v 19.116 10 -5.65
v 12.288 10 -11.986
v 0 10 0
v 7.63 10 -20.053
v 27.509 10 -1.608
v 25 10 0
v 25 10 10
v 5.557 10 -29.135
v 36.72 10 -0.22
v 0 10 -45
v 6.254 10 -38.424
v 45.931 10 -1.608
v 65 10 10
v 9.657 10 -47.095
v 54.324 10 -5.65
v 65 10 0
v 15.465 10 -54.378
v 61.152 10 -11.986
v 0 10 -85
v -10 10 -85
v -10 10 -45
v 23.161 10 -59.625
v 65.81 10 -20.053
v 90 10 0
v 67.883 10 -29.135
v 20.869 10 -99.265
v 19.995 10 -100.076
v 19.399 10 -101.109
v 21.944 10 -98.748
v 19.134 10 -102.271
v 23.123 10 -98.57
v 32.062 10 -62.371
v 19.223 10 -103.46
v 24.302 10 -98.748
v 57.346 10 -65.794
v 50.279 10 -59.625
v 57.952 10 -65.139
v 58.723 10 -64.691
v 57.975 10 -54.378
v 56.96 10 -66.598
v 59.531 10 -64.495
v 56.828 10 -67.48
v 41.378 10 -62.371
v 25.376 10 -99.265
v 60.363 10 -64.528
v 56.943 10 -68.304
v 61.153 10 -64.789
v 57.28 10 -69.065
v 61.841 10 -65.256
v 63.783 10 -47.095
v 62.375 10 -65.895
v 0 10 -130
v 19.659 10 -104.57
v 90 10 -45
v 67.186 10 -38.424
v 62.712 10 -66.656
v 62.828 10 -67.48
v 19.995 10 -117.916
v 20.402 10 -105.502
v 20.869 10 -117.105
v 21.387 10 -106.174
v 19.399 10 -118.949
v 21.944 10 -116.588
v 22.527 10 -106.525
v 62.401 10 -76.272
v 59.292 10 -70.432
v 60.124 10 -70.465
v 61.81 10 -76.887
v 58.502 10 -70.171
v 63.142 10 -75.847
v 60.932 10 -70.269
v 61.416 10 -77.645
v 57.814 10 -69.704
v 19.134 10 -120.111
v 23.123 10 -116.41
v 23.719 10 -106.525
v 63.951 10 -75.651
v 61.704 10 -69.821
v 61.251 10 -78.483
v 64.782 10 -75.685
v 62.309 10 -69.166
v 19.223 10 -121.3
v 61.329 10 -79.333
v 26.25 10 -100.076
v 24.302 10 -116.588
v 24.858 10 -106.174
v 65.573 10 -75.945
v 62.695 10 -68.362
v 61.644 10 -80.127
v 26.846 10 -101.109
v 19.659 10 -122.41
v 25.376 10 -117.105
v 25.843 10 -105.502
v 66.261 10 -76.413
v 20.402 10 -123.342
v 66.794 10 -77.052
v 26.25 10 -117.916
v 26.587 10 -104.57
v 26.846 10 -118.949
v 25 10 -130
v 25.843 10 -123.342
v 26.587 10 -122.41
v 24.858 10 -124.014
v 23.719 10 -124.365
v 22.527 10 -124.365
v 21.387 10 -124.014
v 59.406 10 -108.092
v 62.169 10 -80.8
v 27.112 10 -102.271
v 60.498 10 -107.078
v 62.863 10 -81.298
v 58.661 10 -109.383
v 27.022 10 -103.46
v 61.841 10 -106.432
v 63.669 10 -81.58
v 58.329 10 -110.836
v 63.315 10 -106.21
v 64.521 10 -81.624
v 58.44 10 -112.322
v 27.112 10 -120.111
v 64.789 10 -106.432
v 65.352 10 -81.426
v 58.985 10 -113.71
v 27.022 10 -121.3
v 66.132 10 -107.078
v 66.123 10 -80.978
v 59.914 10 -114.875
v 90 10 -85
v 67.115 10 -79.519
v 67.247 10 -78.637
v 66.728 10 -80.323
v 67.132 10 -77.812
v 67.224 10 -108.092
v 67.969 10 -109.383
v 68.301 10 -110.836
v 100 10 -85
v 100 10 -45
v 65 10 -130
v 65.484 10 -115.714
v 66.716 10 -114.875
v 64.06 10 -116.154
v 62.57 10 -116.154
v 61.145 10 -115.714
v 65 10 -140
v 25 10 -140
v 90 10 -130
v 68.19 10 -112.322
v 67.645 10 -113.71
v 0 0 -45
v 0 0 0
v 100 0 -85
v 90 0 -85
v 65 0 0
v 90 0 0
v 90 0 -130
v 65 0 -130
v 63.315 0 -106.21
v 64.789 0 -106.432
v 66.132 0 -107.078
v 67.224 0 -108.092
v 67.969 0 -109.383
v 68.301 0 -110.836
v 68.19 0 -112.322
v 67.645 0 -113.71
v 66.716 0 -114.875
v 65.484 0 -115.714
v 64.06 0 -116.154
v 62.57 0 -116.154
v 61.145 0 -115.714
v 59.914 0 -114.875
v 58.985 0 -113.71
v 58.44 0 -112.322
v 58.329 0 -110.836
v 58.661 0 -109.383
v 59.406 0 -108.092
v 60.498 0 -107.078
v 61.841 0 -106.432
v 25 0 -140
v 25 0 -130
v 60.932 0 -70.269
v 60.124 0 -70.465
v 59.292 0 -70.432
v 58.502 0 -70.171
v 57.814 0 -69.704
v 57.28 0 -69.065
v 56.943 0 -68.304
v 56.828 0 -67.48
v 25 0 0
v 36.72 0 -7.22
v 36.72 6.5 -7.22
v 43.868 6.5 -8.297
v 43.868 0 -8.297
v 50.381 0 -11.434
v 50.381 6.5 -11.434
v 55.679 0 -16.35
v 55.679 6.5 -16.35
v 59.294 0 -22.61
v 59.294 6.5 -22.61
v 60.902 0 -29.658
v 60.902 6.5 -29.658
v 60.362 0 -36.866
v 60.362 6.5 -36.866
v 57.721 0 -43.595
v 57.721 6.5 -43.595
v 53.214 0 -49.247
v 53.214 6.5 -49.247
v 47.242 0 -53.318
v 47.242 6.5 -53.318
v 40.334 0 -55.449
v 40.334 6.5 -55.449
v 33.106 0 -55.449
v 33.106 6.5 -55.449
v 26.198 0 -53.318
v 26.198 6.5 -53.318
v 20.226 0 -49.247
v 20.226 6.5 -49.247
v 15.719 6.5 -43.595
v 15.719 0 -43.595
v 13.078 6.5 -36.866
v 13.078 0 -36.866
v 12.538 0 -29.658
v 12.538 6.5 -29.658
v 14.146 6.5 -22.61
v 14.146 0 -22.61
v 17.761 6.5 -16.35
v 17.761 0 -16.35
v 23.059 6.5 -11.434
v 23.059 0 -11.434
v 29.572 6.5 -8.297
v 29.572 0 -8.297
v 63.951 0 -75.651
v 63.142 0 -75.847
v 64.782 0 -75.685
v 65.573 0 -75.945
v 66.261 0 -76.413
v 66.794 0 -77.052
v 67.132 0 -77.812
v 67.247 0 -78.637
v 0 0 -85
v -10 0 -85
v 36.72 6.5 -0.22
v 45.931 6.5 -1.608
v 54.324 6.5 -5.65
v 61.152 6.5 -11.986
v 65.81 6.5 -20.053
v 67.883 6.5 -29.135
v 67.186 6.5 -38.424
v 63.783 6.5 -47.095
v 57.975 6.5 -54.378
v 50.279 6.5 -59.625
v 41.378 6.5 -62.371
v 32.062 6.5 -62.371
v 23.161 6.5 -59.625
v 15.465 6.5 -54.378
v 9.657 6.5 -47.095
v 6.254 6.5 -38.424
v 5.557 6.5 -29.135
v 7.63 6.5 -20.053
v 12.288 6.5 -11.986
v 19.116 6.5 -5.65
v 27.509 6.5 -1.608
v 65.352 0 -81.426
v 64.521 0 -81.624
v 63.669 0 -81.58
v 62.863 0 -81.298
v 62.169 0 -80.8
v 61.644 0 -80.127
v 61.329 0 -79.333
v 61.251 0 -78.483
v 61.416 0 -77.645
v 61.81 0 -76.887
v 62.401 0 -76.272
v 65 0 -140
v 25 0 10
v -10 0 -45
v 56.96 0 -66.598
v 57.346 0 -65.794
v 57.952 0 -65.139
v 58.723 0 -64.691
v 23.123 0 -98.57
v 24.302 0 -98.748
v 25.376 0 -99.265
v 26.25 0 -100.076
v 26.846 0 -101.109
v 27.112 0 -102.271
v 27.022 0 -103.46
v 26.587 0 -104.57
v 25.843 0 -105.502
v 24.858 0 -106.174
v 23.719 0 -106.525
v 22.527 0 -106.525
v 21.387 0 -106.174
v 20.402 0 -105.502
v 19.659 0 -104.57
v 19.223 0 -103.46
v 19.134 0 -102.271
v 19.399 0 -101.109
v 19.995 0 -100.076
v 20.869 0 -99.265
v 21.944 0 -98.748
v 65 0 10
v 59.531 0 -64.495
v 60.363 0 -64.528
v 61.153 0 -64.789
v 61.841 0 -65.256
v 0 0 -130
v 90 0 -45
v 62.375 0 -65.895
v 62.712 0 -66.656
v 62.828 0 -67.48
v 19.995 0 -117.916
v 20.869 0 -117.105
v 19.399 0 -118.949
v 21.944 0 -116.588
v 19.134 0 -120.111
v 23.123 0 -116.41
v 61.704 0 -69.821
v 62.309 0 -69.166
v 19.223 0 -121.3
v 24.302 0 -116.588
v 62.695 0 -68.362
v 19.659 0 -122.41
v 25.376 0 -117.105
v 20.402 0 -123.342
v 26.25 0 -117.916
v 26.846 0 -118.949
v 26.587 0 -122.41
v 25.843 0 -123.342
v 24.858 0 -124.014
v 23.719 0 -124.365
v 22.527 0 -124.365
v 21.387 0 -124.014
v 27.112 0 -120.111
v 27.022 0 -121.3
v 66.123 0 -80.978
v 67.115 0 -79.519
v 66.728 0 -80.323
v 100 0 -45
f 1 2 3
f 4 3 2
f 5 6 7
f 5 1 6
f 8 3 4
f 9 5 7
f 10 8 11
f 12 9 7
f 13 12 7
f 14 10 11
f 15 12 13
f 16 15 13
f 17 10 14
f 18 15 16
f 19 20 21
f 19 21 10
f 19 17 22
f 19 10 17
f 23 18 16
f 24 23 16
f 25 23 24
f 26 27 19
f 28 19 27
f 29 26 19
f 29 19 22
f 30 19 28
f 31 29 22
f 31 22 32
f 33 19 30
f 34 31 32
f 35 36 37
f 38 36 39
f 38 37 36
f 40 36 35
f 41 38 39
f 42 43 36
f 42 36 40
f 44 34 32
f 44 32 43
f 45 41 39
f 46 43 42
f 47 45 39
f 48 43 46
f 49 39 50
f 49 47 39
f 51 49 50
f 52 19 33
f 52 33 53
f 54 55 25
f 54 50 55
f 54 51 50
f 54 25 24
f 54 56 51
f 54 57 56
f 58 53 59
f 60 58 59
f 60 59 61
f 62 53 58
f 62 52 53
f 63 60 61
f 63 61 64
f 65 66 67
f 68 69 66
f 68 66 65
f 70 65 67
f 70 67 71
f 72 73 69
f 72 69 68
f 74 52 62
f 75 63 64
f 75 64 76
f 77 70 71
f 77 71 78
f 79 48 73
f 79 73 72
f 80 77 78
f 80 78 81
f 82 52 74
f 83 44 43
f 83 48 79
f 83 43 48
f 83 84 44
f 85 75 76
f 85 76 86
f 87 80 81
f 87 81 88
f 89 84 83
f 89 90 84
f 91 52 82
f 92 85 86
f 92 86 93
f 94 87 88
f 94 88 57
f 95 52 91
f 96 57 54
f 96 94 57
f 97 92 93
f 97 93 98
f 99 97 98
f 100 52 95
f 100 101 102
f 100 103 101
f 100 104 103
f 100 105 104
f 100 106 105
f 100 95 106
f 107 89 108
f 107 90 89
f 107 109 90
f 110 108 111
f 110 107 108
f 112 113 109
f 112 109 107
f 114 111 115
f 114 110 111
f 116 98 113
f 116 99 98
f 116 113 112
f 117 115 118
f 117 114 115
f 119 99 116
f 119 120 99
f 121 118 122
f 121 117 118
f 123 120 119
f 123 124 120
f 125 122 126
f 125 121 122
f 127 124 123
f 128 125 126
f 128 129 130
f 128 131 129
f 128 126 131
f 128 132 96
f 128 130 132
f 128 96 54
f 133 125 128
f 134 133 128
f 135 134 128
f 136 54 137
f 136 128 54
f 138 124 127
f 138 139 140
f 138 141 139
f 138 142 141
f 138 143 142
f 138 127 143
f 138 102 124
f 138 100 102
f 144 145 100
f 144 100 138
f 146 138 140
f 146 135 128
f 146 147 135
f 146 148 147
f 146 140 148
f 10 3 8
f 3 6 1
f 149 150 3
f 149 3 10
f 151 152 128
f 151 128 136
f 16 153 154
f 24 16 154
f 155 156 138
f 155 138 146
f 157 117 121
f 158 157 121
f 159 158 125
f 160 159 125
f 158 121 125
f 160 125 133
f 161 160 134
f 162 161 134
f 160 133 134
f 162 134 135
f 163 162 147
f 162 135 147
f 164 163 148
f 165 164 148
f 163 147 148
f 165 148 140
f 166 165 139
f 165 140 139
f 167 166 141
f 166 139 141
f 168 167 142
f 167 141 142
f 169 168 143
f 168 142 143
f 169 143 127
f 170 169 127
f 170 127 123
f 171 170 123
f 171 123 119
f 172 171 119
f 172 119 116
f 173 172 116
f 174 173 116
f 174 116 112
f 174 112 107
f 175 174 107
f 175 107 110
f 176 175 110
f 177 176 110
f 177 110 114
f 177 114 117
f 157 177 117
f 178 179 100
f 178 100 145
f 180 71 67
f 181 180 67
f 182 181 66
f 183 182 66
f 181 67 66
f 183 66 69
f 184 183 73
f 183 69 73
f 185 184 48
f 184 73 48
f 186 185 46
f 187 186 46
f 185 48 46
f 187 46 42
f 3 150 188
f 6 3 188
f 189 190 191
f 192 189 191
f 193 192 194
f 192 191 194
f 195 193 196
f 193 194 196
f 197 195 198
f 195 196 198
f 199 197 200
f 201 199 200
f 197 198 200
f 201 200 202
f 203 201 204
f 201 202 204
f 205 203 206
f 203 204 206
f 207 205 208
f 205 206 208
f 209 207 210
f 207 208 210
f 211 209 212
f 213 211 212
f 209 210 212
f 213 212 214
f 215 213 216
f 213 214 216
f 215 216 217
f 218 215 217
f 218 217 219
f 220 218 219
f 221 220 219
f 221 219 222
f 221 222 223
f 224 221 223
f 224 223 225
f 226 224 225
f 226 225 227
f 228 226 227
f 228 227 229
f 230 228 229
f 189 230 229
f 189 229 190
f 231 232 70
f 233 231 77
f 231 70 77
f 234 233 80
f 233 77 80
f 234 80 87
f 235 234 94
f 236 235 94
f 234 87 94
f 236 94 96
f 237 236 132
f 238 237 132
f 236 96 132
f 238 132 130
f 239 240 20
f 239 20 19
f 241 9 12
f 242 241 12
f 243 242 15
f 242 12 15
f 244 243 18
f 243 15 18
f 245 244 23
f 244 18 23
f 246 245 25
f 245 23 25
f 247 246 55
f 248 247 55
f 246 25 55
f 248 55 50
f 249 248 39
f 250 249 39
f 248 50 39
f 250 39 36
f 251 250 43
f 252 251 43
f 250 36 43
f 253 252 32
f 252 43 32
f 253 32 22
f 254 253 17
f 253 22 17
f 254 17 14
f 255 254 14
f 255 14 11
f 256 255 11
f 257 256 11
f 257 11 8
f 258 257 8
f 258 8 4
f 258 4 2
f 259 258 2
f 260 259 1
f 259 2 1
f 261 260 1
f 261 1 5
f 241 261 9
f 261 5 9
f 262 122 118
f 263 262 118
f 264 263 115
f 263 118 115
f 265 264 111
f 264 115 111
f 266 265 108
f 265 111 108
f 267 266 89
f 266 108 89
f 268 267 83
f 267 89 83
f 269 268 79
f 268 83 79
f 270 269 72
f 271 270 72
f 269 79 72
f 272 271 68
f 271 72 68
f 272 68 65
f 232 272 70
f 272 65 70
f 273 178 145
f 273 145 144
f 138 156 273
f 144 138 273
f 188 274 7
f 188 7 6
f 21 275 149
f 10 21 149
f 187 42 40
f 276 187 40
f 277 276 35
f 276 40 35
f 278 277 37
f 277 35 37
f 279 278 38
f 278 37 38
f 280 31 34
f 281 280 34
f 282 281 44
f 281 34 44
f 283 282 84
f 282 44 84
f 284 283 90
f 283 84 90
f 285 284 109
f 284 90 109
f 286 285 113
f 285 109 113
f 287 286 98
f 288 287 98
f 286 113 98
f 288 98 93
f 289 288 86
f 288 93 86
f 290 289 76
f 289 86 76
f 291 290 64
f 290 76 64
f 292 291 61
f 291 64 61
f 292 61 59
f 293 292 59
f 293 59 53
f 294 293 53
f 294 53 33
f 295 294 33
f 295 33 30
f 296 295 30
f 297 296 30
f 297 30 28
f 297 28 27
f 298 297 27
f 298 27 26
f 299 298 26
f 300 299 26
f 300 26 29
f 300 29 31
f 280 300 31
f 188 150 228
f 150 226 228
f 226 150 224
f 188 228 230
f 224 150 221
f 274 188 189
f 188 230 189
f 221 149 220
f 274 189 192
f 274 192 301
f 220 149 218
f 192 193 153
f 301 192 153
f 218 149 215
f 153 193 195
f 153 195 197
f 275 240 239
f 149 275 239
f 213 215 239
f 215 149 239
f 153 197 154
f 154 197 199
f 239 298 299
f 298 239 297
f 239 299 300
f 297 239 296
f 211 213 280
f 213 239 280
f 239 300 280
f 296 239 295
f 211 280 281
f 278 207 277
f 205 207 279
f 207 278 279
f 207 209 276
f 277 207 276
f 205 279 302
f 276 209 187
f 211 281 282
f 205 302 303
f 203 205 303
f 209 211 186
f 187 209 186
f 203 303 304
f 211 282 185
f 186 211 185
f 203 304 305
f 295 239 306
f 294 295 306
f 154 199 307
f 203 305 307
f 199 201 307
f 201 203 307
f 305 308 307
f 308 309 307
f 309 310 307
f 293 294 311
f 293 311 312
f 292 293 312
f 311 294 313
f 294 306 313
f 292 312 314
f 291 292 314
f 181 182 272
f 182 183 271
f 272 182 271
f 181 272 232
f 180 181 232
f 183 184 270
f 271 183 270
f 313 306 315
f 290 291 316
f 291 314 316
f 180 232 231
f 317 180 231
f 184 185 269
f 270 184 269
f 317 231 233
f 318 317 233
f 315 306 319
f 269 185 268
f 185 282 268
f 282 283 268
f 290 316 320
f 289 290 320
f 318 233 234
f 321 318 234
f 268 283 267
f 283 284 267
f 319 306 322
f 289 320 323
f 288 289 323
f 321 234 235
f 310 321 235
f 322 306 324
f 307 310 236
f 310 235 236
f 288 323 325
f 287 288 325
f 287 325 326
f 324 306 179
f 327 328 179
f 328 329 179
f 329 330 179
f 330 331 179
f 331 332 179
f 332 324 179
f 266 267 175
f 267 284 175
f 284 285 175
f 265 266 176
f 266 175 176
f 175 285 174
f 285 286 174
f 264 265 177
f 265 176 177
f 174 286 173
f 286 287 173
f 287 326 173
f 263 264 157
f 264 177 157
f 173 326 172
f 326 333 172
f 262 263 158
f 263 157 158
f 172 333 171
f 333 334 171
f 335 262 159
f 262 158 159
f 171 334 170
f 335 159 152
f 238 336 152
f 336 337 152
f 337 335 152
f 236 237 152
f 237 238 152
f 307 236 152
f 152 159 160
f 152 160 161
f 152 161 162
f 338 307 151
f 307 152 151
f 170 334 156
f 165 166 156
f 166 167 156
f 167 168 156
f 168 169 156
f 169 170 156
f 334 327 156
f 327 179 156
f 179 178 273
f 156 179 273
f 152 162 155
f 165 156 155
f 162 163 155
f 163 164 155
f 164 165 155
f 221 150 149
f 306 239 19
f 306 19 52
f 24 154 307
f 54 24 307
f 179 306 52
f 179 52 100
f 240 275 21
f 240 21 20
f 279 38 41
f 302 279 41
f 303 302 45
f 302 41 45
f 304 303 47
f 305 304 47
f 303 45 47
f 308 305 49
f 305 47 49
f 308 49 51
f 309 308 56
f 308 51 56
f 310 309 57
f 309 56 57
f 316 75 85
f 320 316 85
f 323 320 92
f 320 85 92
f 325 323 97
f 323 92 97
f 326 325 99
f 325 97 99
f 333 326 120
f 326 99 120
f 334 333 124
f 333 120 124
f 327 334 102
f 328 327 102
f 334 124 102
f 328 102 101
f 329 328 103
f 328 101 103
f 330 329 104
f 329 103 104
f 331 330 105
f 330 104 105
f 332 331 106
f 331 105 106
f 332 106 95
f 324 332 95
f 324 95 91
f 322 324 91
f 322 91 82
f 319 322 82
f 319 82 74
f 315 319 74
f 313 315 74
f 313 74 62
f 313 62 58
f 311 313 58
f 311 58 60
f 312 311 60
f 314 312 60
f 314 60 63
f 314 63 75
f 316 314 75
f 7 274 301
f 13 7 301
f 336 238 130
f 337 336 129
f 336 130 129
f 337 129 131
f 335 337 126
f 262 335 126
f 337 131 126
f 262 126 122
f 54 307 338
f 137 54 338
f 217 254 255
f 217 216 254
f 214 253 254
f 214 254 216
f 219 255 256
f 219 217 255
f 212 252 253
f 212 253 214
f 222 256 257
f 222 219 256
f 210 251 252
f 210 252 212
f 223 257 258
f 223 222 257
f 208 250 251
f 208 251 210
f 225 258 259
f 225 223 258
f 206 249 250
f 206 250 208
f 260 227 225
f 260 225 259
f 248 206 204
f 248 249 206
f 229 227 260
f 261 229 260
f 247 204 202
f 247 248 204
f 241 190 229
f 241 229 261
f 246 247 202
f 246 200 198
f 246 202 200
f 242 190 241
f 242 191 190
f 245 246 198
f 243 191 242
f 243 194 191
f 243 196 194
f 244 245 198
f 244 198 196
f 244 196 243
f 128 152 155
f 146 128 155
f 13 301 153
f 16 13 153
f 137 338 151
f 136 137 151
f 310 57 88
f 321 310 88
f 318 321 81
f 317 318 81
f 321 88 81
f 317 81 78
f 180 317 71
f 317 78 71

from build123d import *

# Parameters (mm, degrees)
SKETCH1_W           = 90
SKETCH1_H           = 130
SKETCH1_W_2         = 10
SKETCH1_H_2         = 40
SKETCH1_W_3         = 40
SKETCH1_H_3         = 10
BOSS_EXTRUDE1_DEPTH = 10
SKETCH2_R           = 4
CUT_EXTRUDE1_DEPTH  = 173.336879396
CUT_EXTRUDE2_DEPTH  = 173.336879396
SKETCH4_R           = 31.25
CUT_EXTRUDE3_DEPTH  = 3.5
SKETCH5_R           = 24.25
CUT_EXTRUDE4_DEPTH  = 173.169248125
SKETCH6_R           = 5
CUT_EXTRUDE5_DEPTH  = 173.336879396


with BuildPart() as part:
    # Sketch1 → Boss-Extrude1 (new body)
    with BuildSketch(Plane(origin=(0, 0, 0), x_dir=(1, 0, 0), z_dir=(0, 1, 0))):
        with Locations((45, 65)):
            Rectangle(SKETCH1_W, SKETCH1_H)
        with Locations((-5, 65)):
            Rectangle(SKETCH1_W_2, SKETCH1_H_2)
        with Locations((95, 65)):
            Rectangle(SKETCH1_W_2, SKETCH1_H_2)
        with Locations((45, -5)):
            Rectangle(SKETCH1_W_3, SKETCH1_H_3)
        with Locations((45, 135)):
            Rectangle(SKETCH1_W_3, SKETCH1_H_3)
    extrude(amount=BOSS_EXTRUDE1_DEPTH)

    # Sketch2 → Cut-Extrude1 (cut, through all)
    with BuildSketch(Plane(origin=(0, 10, 0), x_dir=(1, 0, 0), z_dir=(0, 1, 0))):
        with Locations(Location((23.122776972, 102.57, 0), (0, 0, 270))):
            Circle(SKETCH2_R)
        with Locations(Location((23.122776972, 120.41, 0), (0, 0, 270))):
            Circle(SKETCH2_R)
    extrude(amount=-CUT_EXTRUDE1_DEPTH, mode=Mode.SUBTRACT)

    # Sketch3 → Cut-Extrude2 (cut, through all)
    with BuildSketch(Plane(origin=(0, 10, 0), x_dir=(1, 0, 0), z_dir=(0, 1, 0))):
        with BuildLine():
            ThreePointArc((65.351977614, 81.42565129), (61.457970709, 79.741397678), (63.142224321, 75.847390774))
            Line((63.142224321, 75.847390774), (65.351977614, 81.42565129))
        make_face()
        with BuildLine():
            Line((65.351977614, 81.42565129), (63.142224321, 75.847390774))
            ThreePointArc((63.142224321, 75.847390774), (65.93312737, 76.155127276), (67.247100967, 78.636521032))
            ThreePointArc((67.247100967, 78.636521032), (66.728494723, 80.322547434), (65.351977614, 81.42565129))
        make_face()
        with BuildLine():
            ThreePointArc((58.722717735, 64.690869742), (61.513620784, 64.998606245), (62.827594381, 67.48))
            Line((62.827594381, 67.48), (59.827594381, 67.48))
            Line((59.827594381, 67.48), (58.722717735, 64.690869742))
        make_face()
        with BuildLine():
            Line((59.827594381, 67.48), (62.827594381, 67.48))
            ThreePointArc((62.827594381, 67.48), (62.308988137, 69.166026403), (60.932471028, 70.269130258))
            Line((60.932471028, 70.269130258), (59.827594381, 67.48))
        make_face()
        with BuildLine():
            Line((58.722717735, 64.690869742), (59.827594381, 67.48))
            Line((59.827594381, 67.48), (56.827594381, 67.48))
            ThreePointArc((56.827594381, 67.48), (57.346200626, 65.793973597), (58.722717735, 64.690869742))
        make_face()
        with BuildLine():
            Line((56.827594381, 67.48), (59.827594381, 67.48))
            Line((59.827594381, 67.48), (60.932471028, 70.269130258))
            ThreePointArc((60.932471028, 70.269130258), (58.141567979, 69.961393755), (56.827594381, 67.48))
        make_face()
    extrude(amount=-CUT_EXTRUDE2_DEPTH, mode=Mode.SUBTRACT)

    # Sketch4 → Cut-Extrude3 (cut)
    with BuildSketch(Plane(origin=(0, 10, 0), x_dir=(1, 0, 0), z_dir=(0, 1, 0))):
        with Locations(Location((36.72, 31.47, 0), (0, 0, 270))):
            Circle(SKETCH4_R)
    extrude(amount=-CUT_EXTRUDE3_DEPTH, mode=Mode.SUBTRACT)

    # Sketch5 → Cut-Extrude4 (cut, through all)
    with BuildSketch(Plane(origin=(0, 6.5, 0), x_dir=(1, 0, 0), z_dir=(0, 1, 0))):
        with Locations(Location((36.72, 31.47, 0), (0, 0, 270))):
            Circle(SKETCH5_R)
    extrude(amount=-CUT_EXTRUDE4_DEPTH, mode=Mode.SUBTRACT)

    # Sketch6 → Cut-Extrude5 (cut, through all)
    with BuildSketch(Plane(origin=(0, 10, 0), x_dir=(1, 0, 0), z_dir=(0, 1, 0))):
        with Locations(Location((63.314917683, 111.209559188, 0), (0, 0, 270))):
            Circle(SKETCH6_R)
    extrude(amount=-CUT_EXTRUDE5_DEPTH, mode=Mode.SUBTRACT)


solid = part.part
